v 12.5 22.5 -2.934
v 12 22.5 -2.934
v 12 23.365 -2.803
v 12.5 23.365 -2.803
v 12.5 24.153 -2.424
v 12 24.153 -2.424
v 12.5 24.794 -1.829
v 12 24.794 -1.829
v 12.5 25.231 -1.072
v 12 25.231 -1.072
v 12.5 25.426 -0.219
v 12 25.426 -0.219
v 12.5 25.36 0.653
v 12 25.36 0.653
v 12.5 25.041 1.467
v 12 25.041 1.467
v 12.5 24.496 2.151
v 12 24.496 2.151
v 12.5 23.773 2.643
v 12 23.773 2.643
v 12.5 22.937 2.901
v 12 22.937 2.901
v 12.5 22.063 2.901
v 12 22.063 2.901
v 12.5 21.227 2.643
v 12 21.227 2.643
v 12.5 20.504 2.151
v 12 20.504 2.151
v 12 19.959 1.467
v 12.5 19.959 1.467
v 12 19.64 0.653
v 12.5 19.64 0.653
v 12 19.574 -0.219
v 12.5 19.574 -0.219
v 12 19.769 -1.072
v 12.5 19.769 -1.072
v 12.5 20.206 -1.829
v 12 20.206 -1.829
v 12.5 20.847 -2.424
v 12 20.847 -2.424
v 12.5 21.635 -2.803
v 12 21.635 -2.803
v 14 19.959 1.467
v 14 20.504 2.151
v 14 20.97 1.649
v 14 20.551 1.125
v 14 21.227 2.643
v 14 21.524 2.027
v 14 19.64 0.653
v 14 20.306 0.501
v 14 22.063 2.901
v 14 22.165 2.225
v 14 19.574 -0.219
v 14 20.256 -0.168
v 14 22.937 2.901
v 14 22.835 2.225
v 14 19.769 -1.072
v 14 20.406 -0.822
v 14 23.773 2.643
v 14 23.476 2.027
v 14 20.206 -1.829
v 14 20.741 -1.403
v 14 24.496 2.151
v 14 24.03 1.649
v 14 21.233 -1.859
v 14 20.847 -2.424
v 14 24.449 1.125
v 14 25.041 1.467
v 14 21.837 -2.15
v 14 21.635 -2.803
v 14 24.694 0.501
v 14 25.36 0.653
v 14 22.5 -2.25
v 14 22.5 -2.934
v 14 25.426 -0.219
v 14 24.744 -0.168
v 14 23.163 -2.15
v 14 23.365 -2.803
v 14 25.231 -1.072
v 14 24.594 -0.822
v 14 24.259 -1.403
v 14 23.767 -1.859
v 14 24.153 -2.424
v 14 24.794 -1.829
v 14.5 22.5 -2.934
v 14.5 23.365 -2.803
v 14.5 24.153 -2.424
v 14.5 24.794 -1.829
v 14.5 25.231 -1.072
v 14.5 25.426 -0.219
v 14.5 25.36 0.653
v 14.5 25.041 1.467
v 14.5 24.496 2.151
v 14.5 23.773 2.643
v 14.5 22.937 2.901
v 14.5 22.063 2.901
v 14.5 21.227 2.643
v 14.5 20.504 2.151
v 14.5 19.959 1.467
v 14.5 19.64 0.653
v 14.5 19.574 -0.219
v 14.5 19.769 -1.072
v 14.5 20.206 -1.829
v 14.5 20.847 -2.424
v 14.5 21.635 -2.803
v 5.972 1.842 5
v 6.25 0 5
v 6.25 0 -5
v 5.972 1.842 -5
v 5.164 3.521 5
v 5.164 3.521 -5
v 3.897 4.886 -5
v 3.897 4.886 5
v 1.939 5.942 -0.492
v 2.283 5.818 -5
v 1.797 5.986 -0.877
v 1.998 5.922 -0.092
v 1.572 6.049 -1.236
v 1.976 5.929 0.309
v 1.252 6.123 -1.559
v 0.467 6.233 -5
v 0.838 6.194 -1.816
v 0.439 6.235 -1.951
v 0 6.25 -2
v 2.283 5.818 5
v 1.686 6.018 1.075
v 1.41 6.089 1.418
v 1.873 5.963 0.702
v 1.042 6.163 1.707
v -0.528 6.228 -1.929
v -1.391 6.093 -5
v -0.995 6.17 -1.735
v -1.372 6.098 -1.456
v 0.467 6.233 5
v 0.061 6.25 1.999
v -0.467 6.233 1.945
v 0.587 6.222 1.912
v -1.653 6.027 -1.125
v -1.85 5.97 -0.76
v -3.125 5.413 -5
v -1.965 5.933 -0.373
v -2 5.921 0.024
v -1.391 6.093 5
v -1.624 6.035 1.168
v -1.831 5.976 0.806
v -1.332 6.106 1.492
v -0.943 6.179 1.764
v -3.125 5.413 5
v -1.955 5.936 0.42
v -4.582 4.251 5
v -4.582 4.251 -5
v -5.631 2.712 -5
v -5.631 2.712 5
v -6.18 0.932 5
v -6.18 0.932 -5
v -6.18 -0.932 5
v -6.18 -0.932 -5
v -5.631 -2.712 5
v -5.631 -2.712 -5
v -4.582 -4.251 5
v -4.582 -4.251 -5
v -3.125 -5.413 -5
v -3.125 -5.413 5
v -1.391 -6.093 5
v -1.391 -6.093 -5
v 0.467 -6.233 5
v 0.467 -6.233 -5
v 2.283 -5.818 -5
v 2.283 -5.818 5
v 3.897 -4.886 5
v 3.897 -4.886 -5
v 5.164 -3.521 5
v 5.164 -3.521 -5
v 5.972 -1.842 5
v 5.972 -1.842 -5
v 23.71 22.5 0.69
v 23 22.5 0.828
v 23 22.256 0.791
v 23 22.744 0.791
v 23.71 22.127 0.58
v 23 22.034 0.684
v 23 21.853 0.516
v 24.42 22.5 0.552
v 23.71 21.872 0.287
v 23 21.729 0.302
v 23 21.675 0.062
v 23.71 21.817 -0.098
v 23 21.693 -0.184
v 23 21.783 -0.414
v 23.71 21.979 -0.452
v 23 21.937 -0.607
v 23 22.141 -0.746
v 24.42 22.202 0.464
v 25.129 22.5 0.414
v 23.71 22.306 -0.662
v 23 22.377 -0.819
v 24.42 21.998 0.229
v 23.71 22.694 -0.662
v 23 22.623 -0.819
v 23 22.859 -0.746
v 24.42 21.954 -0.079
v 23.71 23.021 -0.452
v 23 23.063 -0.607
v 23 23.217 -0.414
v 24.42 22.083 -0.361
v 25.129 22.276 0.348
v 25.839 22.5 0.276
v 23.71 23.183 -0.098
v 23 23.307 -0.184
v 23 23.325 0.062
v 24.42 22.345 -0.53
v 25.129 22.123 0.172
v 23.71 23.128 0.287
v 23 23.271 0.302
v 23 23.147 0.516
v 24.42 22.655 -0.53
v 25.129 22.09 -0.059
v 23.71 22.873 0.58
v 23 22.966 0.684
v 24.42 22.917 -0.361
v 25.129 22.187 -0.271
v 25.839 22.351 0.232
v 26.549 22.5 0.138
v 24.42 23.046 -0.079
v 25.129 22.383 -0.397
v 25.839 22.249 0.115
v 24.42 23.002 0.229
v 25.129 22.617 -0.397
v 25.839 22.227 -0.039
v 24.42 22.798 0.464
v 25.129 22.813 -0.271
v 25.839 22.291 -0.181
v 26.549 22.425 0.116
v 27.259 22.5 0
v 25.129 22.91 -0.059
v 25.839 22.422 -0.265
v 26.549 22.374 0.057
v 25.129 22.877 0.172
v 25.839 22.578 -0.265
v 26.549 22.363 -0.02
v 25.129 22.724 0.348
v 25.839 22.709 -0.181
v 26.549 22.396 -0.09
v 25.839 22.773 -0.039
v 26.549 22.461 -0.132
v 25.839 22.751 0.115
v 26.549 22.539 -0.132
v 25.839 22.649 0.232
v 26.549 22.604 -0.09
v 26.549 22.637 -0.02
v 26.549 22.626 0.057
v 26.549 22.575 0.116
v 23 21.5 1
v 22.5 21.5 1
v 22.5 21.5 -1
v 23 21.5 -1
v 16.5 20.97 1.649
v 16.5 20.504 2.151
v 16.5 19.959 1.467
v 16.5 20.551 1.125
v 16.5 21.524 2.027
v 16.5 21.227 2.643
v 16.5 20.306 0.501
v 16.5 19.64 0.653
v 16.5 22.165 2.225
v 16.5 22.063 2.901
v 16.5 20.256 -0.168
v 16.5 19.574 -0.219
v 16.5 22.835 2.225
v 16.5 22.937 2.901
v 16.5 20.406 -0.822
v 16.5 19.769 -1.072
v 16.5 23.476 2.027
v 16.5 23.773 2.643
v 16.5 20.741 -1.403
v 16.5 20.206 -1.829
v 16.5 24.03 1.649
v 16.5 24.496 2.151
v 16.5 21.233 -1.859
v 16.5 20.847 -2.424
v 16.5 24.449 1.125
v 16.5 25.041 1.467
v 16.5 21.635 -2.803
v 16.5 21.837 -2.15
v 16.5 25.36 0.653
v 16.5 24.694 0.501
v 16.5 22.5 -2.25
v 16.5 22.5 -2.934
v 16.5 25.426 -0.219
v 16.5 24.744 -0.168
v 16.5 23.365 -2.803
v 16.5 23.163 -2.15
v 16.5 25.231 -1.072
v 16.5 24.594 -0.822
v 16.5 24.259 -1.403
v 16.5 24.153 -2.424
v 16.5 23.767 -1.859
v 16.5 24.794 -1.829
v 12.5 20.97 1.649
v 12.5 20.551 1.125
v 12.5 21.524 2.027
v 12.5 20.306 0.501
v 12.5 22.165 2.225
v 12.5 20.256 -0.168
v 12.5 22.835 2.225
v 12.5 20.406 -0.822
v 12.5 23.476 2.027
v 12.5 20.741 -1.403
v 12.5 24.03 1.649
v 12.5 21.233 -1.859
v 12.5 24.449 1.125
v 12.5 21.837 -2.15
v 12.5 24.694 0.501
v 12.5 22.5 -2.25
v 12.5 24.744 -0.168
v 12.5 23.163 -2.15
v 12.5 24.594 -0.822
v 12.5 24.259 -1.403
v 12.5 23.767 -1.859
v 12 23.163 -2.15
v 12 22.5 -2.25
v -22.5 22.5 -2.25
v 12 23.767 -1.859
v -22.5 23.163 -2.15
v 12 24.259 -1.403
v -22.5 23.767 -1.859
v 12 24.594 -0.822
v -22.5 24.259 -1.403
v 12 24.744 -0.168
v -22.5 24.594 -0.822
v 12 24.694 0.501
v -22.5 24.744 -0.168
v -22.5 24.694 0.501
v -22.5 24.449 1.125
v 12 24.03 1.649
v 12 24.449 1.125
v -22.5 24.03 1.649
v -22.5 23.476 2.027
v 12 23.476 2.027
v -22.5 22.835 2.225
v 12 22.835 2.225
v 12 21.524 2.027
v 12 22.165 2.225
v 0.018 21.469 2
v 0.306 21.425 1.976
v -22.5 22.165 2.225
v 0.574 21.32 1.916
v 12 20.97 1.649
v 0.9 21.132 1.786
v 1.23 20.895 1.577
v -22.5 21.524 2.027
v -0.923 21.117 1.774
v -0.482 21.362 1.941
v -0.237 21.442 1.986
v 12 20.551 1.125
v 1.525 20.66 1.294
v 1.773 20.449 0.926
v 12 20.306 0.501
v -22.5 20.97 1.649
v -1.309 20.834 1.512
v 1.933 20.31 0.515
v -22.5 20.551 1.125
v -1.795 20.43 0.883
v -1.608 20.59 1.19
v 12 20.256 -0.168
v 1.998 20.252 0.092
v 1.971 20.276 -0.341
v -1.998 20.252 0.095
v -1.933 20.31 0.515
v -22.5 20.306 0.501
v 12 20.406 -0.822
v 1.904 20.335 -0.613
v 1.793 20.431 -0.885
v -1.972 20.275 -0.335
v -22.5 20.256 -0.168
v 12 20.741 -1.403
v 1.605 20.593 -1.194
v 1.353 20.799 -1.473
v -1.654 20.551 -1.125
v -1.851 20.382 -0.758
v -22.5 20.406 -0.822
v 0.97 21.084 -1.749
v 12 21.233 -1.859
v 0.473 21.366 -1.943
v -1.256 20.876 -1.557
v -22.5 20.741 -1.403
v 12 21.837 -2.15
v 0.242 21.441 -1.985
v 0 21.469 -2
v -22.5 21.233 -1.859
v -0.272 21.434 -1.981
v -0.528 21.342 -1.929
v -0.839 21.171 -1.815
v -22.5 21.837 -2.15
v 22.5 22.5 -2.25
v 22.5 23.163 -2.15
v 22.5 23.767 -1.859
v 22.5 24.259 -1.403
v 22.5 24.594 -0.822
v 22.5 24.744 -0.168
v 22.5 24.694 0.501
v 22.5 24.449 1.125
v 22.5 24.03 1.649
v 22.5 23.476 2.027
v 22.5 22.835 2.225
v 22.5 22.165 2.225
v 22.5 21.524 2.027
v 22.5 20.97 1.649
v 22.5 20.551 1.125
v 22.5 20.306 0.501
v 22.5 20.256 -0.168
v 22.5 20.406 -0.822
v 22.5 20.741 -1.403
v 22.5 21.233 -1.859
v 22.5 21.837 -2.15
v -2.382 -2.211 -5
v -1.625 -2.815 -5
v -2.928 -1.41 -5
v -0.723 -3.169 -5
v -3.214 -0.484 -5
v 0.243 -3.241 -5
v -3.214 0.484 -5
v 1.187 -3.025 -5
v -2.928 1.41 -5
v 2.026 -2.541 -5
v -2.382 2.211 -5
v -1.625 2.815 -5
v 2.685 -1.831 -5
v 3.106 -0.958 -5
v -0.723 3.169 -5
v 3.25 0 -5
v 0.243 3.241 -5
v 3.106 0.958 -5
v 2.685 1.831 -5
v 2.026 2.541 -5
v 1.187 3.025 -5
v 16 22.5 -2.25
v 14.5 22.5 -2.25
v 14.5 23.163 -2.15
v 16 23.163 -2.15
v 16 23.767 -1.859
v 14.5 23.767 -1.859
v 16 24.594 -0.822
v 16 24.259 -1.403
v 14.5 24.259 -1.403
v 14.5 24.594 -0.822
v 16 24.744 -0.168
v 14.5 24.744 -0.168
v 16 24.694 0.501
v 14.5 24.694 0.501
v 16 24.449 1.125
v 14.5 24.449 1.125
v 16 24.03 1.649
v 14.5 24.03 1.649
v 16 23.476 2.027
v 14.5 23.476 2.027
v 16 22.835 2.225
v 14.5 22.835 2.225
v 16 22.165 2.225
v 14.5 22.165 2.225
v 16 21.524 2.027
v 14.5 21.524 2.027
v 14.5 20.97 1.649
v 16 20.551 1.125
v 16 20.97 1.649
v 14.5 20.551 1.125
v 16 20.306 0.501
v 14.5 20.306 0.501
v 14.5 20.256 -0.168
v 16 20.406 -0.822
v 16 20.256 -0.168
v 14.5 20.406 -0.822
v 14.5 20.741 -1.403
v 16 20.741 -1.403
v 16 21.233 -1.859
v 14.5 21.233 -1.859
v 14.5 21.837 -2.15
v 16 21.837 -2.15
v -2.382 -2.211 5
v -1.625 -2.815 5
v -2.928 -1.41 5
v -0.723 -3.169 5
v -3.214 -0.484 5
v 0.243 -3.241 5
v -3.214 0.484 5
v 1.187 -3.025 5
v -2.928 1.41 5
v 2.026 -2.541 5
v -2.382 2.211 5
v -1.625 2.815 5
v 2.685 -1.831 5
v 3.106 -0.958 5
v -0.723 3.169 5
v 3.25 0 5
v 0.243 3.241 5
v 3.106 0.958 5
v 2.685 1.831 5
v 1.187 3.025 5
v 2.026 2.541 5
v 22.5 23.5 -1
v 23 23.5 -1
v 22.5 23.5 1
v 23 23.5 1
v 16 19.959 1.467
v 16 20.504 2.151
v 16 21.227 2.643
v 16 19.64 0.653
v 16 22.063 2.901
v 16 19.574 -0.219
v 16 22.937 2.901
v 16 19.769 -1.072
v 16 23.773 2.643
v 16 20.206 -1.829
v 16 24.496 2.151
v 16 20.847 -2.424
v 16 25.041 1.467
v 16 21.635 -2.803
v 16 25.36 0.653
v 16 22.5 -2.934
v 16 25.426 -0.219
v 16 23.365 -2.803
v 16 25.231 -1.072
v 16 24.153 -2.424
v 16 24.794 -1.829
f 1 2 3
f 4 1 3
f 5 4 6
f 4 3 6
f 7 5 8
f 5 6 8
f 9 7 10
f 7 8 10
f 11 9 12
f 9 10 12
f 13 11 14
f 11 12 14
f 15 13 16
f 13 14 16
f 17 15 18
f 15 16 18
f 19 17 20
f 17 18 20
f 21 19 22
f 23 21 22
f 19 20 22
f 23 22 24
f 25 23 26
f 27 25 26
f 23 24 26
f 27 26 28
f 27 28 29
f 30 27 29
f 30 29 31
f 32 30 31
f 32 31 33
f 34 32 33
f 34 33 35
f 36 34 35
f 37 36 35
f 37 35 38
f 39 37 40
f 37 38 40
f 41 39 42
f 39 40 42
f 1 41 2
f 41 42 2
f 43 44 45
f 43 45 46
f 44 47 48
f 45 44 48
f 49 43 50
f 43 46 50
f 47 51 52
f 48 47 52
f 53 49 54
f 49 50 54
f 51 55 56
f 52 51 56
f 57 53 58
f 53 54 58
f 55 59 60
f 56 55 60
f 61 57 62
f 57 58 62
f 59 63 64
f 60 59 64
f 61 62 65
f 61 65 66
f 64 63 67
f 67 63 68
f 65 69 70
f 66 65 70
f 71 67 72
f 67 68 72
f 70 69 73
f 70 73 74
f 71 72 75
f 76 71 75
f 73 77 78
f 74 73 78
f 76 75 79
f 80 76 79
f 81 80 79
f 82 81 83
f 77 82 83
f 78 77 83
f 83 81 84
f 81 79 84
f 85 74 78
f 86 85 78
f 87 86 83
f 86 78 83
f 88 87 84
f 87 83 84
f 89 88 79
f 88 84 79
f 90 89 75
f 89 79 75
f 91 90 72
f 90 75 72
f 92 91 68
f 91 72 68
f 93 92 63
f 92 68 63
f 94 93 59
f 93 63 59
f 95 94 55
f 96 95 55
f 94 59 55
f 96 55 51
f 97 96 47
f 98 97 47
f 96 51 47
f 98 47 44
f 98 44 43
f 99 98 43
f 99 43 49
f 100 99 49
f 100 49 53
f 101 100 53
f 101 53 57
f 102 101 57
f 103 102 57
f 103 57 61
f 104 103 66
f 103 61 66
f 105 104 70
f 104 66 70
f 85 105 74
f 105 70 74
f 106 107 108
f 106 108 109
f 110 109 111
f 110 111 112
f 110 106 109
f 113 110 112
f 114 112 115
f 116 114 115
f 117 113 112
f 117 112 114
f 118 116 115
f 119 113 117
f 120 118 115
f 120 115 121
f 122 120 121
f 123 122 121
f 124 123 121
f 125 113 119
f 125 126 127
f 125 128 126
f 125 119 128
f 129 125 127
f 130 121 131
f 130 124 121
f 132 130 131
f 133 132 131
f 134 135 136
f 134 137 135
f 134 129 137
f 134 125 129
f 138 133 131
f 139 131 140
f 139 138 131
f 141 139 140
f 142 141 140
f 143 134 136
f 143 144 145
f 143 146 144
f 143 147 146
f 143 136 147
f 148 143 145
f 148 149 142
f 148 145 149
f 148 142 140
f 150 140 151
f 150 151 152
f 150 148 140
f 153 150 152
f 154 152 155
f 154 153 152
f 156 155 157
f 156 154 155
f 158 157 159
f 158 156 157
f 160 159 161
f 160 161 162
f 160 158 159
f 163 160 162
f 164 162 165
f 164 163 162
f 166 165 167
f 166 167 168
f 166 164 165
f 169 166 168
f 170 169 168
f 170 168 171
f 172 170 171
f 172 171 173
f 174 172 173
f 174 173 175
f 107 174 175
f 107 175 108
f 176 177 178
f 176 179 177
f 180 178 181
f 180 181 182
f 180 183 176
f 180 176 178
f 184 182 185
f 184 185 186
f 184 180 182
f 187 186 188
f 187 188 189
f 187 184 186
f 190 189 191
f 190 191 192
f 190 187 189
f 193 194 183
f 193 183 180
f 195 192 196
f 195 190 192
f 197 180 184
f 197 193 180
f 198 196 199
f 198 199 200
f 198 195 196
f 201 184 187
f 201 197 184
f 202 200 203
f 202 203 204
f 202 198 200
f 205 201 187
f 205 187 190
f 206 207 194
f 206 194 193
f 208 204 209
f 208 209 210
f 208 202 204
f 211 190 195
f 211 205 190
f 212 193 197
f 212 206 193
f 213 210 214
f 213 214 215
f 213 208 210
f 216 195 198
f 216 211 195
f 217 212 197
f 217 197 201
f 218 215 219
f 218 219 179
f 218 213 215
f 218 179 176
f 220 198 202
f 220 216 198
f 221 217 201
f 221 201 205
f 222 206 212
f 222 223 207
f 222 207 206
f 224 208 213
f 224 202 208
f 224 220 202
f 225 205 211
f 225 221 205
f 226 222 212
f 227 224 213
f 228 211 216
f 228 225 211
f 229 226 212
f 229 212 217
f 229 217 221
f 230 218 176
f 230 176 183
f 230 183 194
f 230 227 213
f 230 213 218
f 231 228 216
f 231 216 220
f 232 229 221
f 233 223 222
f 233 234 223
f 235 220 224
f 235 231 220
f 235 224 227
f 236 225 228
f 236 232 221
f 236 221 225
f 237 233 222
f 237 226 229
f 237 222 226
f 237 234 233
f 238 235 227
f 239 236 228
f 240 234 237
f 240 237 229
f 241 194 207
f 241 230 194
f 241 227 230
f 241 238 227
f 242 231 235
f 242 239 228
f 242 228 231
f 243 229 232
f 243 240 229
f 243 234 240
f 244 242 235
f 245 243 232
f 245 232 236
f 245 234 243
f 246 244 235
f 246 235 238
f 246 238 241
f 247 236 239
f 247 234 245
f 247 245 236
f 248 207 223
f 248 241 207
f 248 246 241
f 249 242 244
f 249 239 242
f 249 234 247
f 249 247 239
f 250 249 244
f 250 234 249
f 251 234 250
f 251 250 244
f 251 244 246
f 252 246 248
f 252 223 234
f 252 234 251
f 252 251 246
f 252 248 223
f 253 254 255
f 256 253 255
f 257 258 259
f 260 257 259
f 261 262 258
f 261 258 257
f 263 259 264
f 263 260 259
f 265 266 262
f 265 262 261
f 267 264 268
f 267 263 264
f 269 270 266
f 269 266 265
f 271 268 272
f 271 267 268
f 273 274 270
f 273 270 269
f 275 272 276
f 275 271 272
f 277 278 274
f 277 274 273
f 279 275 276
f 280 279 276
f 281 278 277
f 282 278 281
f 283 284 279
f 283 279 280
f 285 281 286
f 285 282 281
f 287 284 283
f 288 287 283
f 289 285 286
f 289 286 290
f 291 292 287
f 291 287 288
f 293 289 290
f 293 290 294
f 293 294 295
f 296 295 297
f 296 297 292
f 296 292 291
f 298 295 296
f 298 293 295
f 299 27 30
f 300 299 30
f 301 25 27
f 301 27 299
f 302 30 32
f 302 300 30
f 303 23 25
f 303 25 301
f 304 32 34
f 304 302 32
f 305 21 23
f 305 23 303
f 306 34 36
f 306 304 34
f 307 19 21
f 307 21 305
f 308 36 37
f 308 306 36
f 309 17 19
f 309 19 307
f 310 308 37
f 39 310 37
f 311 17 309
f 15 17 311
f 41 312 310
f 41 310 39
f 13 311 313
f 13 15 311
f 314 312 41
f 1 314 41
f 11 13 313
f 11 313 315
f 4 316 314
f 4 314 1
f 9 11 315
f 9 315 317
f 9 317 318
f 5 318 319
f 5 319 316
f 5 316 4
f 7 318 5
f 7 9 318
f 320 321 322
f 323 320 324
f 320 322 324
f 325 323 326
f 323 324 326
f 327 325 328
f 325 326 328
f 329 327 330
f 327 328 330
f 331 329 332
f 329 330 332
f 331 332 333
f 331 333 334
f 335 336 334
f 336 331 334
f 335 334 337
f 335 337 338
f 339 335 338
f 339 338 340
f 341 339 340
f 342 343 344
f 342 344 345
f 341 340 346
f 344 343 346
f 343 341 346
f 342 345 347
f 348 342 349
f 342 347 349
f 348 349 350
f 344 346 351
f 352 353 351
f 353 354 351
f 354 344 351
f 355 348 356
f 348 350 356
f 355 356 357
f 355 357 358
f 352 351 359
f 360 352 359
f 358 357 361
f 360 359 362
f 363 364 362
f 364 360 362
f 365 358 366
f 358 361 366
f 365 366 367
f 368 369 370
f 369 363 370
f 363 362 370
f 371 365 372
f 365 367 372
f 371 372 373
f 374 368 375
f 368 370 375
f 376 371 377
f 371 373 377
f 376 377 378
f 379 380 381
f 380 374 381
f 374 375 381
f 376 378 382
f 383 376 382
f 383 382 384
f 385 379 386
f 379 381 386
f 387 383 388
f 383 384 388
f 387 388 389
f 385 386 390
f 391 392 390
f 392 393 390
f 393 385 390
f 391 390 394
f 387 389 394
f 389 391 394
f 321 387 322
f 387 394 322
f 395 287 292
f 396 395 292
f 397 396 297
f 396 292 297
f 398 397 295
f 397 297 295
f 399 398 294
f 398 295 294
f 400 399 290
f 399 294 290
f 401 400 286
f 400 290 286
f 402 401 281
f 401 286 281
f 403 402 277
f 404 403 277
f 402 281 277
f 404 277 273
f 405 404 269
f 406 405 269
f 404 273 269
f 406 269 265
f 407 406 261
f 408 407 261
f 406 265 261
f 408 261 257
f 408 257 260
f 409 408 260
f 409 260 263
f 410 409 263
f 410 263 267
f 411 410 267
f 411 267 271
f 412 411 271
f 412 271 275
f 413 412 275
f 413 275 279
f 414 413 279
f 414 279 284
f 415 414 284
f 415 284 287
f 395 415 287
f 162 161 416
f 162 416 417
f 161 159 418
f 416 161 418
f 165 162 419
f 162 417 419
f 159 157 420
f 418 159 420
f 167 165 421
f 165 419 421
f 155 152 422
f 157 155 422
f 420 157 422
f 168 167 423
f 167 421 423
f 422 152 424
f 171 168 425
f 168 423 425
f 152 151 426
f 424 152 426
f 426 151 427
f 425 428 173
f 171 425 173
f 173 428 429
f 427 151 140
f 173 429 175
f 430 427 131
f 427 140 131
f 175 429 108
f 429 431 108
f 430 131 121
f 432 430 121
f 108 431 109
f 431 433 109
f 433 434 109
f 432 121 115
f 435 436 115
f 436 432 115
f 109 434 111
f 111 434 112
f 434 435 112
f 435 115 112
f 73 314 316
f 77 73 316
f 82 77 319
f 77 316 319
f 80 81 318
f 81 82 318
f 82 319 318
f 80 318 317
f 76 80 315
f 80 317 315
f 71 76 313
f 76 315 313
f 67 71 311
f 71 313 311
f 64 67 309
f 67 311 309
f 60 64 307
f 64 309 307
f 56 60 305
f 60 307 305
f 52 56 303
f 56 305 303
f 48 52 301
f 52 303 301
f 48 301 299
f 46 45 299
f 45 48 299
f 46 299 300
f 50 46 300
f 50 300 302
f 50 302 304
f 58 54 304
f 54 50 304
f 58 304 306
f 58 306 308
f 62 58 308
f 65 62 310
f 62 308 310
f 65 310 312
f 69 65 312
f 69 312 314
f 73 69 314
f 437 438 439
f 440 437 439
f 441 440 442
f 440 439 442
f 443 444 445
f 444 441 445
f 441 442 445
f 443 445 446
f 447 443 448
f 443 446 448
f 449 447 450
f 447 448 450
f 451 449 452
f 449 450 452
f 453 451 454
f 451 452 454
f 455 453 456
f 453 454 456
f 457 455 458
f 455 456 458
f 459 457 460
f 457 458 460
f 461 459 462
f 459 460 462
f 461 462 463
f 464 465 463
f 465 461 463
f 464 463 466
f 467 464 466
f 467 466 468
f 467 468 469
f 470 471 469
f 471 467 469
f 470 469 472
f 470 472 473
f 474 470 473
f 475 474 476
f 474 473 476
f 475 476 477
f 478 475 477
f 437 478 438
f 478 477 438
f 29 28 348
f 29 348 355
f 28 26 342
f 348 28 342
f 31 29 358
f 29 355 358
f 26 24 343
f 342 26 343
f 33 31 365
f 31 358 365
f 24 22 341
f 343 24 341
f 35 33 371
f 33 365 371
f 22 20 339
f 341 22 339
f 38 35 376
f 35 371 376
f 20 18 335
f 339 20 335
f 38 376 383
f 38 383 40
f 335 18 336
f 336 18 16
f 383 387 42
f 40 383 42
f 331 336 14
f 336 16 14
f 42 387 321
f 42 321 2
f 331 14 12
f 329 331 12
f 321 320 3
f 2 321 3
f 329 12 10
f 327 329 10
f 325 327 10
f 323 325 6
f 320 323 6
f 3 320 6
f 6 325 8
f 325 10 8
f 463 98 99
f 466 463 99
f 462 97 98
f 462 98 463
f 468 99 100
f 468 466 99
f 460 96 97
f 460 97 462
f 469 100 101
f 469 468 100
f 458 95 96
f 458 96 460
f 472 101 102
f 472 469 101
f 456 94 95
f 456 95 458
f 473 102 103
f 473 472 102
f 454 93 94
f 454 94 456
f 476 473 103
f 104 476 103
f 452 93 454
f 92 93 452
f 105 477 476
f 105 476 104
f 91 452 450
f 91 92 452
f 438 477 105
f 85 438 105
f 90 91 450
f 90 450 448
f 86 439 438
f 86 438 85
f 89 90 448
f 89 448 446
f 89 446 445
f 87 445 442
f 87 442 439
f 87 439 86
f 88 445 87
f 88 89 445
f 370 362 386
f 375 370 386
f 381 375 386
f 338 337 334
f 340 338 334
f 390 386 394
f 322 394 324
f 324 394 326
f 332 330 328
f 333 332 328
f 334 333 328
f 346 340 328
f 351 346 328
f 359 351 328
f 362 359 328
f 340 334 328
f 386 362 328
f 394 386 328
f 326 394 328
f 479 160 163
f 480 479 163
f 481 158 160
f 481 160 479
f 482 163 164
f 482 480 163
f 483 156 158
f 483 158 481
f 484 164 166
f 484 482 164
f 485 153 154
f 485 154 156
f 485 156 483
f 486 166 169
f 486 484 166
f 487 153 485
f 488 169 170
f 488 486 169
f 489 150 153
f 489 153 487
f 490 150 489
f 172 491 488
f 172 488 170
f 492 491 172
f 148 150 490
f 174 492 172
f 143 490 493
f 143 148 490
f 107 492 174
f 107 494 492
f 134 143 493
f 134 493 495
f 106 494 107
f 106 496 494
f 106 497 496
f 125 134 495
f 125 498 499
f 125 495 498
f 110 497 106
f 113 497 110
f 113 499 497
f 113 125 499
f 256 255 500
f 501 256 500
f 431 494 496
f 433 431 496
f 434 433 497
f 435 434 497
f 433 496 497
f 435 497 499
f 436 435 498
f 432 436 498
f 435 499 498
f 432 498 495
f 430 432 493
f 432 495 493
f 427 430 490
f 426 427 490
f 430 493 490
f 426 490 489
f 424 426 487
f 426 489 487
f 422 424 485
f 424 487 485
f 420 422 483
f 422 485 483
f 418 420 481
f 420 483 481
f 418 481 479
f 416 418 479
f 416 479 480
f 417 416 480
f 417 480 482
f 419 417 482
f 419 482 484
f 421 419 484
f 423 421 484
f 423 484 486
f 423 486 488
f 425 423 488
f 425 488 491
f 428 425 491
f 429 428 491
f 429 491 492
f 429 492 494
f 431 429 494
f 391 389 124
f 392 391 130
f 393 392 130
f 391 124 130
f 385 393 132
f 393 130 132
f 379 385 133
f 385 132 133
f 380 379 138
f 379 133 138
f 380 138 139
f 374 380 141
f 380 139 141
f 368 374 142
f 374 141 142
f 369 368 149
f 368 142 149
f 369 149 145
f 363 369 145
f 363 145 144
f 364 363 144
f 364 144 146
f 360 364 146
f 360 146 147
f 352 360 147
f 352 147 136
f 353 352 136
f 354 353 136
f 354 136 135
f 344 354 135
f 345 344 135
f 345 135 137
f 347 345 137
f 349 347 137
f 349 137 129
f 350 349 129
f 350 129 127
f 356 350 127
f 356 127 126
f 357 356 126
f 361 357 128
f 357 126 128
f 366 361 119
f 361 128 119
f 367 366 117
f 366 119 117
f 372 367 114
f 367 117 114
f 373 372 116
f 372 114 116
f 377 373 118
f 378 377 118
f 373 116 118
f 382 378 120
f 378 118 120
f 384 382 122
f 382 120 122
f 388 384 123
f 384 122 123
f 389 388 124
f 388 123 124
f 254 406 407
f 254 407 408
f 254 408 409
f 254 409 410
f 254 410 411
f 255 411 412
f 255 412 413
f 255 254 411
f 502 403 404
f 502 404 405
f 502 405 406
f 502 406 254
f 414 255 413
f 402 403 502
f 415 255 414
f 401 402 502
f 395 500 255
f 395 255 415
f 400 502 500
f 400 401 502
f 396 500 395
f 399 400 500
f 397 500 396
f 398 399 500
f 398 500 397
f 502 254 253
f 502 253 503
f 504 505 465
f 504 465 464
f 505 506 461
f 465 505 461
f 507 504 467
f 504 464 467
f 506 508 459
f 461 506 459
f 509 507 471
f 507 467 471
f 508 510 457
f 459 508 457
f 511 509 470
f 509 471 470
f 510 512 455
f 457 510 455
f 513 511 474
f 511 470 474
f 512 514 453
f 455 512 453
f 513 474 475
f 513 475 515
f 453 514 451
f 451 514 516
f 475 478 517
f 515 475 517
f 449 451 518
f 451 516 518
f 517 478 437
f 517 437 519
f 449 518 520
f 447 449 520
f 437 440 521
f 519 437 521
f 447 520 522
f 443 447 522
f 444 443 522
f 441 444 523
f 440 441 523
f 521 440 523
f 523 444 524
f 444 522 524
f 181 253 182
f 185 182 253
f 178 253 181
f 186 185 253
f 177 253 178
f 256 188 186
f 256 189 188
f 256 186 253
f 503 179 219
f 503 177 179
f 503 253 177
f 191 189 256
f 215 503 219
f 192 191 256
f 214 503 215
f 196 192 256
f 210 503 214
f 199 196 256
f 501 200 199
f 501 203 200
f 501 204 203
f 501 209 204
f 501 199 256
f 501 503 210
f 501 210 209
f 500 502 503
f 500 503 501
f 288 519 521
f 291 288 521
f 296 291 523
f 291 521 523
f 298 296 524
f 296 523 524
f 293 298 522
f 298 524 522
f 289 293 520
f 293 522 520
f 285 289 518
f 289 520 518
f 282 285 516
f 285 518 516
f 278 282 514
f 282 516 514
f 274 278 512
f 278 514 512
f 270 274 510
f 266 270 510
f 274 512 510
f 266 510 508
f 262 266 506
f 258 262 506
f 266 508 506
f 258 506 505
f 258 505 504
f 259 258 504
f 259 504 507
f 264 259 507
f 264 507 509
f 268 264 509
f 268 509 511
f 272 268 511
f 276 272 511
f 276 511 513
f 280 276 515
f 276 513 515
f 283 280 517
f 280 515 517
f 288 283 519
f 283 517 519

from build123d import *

# Parameters (mm, degrees)
SKETCH2_R           = 6.25
EXTRUDE1_DEPTH      = 5
SKETCH3_R           = 2
EXTRUDE2_DEPTH      = 22.5
EXTRUDE3_DEPTH      = 22.5
EXTRUDE3_DEPTH_BACK = 22.5
SKETCH4_R           = 2.25
SKETCH5_R           = 2.933820517
EXTRUDE4_DEPTH      = 0.5
LPATTERN1_COUNT     = 3
LPATTERN1_PITCH     = 2
SKETCH9_W           = 2
SKETCH9_H           = 2
EXTRUDE6_DEPTH      = 0.5
SKETCH7_R           = 3.25
CUT_EXTRUDE1_DEPTH  = 39.599438251


with BuildPart() as part:
    # Sketch2 → Extrude1 (new, symmetric)
    with BuildSketch(Plane.XY):
        Circle(SKETCH2_R)
    extrude(amount=EXTRUDE1_DEPTH, both=True)

    # Sketch3 → Extrude2 (add)
    with BuildSketch(Plane(origin=(0, 0, 0), x_dir=(-1, 0, 0), z_dir=(0, 1, 0))):
        Circle(SKETCH3_R)
    extrude(amount=EXTRUDE2_DEPTH)

    # Sketch4 → Extrude3 (add, two sides: drawn at the far end of the back side and taken through both)
    with BuildSketch(Plane(origin=(0, 0, 0), x_dir=(0, 0, -1), z_dir=(1, 0, 0)).offset(-EXTRUDE3_DEPTH_BACK)):
        with Locations((0, 22.5)):
            Circle(SKETCH4_R)
    extrude(amount=EXTRUDE3_DEPTH + EXTRUDE3_DEPTH_BACK)

    # Sketch5 → Extrude4 (add)
    with BuildSketch(Plane(origin=(12, 0, 0), x_dir=(0, 0, -1), z_dir=(1, 0, 0))):
        with Locations((0, 22.5)):
            Circle(SKETCH5_R)
    extrude4 = extrude(amount=EXTRUDE4_DEPTH)

    # LPattern1: Extrude4 ×3
    with Locations(*[(i * LPATTERN1_PITCH, 0, 0) for i in range(1, LPATTERN1_COUNT)]):
        add(extrude4)

    # Sketch9 → Extrude6 (add)
    with BuildSketch(Plane(origin=(22.5, 0, 0), x_dir=(0, 0, -1), z_dir=(1, 0, 0))):
        with Locations((0, 22.5)):
            Rectangle(SKETCH9_W, SKETCH9_H)
    extrude(amount=EXTRUDE6_DEPTH)

    # Extrude5 cone 1 section (through the dimple's axis) → Extrude5 (revolve)
    with BuildSketch(Plane(origin=(22.5, 22.5, 0), x_dir=(0, 0, 1), z_dir=(0, 1, 0))):
        Polygon((0, 0), (0.925, 0), (0, 4.758712465), align=None)
    revolve(axis=Axis((22.5, 22.5, 0), (1, 0, 0)))

    # Sketch7 → Cut-Extrude1 (cut, through all)
    with BuildSketch(Plane.XY.offset(5)):
        Circle(SKETCH7_R)
    extrude(amount=-CUT_EXTRUDE1_DEPTH, mode=Mode.SUBTRACT)


solid = part.part
